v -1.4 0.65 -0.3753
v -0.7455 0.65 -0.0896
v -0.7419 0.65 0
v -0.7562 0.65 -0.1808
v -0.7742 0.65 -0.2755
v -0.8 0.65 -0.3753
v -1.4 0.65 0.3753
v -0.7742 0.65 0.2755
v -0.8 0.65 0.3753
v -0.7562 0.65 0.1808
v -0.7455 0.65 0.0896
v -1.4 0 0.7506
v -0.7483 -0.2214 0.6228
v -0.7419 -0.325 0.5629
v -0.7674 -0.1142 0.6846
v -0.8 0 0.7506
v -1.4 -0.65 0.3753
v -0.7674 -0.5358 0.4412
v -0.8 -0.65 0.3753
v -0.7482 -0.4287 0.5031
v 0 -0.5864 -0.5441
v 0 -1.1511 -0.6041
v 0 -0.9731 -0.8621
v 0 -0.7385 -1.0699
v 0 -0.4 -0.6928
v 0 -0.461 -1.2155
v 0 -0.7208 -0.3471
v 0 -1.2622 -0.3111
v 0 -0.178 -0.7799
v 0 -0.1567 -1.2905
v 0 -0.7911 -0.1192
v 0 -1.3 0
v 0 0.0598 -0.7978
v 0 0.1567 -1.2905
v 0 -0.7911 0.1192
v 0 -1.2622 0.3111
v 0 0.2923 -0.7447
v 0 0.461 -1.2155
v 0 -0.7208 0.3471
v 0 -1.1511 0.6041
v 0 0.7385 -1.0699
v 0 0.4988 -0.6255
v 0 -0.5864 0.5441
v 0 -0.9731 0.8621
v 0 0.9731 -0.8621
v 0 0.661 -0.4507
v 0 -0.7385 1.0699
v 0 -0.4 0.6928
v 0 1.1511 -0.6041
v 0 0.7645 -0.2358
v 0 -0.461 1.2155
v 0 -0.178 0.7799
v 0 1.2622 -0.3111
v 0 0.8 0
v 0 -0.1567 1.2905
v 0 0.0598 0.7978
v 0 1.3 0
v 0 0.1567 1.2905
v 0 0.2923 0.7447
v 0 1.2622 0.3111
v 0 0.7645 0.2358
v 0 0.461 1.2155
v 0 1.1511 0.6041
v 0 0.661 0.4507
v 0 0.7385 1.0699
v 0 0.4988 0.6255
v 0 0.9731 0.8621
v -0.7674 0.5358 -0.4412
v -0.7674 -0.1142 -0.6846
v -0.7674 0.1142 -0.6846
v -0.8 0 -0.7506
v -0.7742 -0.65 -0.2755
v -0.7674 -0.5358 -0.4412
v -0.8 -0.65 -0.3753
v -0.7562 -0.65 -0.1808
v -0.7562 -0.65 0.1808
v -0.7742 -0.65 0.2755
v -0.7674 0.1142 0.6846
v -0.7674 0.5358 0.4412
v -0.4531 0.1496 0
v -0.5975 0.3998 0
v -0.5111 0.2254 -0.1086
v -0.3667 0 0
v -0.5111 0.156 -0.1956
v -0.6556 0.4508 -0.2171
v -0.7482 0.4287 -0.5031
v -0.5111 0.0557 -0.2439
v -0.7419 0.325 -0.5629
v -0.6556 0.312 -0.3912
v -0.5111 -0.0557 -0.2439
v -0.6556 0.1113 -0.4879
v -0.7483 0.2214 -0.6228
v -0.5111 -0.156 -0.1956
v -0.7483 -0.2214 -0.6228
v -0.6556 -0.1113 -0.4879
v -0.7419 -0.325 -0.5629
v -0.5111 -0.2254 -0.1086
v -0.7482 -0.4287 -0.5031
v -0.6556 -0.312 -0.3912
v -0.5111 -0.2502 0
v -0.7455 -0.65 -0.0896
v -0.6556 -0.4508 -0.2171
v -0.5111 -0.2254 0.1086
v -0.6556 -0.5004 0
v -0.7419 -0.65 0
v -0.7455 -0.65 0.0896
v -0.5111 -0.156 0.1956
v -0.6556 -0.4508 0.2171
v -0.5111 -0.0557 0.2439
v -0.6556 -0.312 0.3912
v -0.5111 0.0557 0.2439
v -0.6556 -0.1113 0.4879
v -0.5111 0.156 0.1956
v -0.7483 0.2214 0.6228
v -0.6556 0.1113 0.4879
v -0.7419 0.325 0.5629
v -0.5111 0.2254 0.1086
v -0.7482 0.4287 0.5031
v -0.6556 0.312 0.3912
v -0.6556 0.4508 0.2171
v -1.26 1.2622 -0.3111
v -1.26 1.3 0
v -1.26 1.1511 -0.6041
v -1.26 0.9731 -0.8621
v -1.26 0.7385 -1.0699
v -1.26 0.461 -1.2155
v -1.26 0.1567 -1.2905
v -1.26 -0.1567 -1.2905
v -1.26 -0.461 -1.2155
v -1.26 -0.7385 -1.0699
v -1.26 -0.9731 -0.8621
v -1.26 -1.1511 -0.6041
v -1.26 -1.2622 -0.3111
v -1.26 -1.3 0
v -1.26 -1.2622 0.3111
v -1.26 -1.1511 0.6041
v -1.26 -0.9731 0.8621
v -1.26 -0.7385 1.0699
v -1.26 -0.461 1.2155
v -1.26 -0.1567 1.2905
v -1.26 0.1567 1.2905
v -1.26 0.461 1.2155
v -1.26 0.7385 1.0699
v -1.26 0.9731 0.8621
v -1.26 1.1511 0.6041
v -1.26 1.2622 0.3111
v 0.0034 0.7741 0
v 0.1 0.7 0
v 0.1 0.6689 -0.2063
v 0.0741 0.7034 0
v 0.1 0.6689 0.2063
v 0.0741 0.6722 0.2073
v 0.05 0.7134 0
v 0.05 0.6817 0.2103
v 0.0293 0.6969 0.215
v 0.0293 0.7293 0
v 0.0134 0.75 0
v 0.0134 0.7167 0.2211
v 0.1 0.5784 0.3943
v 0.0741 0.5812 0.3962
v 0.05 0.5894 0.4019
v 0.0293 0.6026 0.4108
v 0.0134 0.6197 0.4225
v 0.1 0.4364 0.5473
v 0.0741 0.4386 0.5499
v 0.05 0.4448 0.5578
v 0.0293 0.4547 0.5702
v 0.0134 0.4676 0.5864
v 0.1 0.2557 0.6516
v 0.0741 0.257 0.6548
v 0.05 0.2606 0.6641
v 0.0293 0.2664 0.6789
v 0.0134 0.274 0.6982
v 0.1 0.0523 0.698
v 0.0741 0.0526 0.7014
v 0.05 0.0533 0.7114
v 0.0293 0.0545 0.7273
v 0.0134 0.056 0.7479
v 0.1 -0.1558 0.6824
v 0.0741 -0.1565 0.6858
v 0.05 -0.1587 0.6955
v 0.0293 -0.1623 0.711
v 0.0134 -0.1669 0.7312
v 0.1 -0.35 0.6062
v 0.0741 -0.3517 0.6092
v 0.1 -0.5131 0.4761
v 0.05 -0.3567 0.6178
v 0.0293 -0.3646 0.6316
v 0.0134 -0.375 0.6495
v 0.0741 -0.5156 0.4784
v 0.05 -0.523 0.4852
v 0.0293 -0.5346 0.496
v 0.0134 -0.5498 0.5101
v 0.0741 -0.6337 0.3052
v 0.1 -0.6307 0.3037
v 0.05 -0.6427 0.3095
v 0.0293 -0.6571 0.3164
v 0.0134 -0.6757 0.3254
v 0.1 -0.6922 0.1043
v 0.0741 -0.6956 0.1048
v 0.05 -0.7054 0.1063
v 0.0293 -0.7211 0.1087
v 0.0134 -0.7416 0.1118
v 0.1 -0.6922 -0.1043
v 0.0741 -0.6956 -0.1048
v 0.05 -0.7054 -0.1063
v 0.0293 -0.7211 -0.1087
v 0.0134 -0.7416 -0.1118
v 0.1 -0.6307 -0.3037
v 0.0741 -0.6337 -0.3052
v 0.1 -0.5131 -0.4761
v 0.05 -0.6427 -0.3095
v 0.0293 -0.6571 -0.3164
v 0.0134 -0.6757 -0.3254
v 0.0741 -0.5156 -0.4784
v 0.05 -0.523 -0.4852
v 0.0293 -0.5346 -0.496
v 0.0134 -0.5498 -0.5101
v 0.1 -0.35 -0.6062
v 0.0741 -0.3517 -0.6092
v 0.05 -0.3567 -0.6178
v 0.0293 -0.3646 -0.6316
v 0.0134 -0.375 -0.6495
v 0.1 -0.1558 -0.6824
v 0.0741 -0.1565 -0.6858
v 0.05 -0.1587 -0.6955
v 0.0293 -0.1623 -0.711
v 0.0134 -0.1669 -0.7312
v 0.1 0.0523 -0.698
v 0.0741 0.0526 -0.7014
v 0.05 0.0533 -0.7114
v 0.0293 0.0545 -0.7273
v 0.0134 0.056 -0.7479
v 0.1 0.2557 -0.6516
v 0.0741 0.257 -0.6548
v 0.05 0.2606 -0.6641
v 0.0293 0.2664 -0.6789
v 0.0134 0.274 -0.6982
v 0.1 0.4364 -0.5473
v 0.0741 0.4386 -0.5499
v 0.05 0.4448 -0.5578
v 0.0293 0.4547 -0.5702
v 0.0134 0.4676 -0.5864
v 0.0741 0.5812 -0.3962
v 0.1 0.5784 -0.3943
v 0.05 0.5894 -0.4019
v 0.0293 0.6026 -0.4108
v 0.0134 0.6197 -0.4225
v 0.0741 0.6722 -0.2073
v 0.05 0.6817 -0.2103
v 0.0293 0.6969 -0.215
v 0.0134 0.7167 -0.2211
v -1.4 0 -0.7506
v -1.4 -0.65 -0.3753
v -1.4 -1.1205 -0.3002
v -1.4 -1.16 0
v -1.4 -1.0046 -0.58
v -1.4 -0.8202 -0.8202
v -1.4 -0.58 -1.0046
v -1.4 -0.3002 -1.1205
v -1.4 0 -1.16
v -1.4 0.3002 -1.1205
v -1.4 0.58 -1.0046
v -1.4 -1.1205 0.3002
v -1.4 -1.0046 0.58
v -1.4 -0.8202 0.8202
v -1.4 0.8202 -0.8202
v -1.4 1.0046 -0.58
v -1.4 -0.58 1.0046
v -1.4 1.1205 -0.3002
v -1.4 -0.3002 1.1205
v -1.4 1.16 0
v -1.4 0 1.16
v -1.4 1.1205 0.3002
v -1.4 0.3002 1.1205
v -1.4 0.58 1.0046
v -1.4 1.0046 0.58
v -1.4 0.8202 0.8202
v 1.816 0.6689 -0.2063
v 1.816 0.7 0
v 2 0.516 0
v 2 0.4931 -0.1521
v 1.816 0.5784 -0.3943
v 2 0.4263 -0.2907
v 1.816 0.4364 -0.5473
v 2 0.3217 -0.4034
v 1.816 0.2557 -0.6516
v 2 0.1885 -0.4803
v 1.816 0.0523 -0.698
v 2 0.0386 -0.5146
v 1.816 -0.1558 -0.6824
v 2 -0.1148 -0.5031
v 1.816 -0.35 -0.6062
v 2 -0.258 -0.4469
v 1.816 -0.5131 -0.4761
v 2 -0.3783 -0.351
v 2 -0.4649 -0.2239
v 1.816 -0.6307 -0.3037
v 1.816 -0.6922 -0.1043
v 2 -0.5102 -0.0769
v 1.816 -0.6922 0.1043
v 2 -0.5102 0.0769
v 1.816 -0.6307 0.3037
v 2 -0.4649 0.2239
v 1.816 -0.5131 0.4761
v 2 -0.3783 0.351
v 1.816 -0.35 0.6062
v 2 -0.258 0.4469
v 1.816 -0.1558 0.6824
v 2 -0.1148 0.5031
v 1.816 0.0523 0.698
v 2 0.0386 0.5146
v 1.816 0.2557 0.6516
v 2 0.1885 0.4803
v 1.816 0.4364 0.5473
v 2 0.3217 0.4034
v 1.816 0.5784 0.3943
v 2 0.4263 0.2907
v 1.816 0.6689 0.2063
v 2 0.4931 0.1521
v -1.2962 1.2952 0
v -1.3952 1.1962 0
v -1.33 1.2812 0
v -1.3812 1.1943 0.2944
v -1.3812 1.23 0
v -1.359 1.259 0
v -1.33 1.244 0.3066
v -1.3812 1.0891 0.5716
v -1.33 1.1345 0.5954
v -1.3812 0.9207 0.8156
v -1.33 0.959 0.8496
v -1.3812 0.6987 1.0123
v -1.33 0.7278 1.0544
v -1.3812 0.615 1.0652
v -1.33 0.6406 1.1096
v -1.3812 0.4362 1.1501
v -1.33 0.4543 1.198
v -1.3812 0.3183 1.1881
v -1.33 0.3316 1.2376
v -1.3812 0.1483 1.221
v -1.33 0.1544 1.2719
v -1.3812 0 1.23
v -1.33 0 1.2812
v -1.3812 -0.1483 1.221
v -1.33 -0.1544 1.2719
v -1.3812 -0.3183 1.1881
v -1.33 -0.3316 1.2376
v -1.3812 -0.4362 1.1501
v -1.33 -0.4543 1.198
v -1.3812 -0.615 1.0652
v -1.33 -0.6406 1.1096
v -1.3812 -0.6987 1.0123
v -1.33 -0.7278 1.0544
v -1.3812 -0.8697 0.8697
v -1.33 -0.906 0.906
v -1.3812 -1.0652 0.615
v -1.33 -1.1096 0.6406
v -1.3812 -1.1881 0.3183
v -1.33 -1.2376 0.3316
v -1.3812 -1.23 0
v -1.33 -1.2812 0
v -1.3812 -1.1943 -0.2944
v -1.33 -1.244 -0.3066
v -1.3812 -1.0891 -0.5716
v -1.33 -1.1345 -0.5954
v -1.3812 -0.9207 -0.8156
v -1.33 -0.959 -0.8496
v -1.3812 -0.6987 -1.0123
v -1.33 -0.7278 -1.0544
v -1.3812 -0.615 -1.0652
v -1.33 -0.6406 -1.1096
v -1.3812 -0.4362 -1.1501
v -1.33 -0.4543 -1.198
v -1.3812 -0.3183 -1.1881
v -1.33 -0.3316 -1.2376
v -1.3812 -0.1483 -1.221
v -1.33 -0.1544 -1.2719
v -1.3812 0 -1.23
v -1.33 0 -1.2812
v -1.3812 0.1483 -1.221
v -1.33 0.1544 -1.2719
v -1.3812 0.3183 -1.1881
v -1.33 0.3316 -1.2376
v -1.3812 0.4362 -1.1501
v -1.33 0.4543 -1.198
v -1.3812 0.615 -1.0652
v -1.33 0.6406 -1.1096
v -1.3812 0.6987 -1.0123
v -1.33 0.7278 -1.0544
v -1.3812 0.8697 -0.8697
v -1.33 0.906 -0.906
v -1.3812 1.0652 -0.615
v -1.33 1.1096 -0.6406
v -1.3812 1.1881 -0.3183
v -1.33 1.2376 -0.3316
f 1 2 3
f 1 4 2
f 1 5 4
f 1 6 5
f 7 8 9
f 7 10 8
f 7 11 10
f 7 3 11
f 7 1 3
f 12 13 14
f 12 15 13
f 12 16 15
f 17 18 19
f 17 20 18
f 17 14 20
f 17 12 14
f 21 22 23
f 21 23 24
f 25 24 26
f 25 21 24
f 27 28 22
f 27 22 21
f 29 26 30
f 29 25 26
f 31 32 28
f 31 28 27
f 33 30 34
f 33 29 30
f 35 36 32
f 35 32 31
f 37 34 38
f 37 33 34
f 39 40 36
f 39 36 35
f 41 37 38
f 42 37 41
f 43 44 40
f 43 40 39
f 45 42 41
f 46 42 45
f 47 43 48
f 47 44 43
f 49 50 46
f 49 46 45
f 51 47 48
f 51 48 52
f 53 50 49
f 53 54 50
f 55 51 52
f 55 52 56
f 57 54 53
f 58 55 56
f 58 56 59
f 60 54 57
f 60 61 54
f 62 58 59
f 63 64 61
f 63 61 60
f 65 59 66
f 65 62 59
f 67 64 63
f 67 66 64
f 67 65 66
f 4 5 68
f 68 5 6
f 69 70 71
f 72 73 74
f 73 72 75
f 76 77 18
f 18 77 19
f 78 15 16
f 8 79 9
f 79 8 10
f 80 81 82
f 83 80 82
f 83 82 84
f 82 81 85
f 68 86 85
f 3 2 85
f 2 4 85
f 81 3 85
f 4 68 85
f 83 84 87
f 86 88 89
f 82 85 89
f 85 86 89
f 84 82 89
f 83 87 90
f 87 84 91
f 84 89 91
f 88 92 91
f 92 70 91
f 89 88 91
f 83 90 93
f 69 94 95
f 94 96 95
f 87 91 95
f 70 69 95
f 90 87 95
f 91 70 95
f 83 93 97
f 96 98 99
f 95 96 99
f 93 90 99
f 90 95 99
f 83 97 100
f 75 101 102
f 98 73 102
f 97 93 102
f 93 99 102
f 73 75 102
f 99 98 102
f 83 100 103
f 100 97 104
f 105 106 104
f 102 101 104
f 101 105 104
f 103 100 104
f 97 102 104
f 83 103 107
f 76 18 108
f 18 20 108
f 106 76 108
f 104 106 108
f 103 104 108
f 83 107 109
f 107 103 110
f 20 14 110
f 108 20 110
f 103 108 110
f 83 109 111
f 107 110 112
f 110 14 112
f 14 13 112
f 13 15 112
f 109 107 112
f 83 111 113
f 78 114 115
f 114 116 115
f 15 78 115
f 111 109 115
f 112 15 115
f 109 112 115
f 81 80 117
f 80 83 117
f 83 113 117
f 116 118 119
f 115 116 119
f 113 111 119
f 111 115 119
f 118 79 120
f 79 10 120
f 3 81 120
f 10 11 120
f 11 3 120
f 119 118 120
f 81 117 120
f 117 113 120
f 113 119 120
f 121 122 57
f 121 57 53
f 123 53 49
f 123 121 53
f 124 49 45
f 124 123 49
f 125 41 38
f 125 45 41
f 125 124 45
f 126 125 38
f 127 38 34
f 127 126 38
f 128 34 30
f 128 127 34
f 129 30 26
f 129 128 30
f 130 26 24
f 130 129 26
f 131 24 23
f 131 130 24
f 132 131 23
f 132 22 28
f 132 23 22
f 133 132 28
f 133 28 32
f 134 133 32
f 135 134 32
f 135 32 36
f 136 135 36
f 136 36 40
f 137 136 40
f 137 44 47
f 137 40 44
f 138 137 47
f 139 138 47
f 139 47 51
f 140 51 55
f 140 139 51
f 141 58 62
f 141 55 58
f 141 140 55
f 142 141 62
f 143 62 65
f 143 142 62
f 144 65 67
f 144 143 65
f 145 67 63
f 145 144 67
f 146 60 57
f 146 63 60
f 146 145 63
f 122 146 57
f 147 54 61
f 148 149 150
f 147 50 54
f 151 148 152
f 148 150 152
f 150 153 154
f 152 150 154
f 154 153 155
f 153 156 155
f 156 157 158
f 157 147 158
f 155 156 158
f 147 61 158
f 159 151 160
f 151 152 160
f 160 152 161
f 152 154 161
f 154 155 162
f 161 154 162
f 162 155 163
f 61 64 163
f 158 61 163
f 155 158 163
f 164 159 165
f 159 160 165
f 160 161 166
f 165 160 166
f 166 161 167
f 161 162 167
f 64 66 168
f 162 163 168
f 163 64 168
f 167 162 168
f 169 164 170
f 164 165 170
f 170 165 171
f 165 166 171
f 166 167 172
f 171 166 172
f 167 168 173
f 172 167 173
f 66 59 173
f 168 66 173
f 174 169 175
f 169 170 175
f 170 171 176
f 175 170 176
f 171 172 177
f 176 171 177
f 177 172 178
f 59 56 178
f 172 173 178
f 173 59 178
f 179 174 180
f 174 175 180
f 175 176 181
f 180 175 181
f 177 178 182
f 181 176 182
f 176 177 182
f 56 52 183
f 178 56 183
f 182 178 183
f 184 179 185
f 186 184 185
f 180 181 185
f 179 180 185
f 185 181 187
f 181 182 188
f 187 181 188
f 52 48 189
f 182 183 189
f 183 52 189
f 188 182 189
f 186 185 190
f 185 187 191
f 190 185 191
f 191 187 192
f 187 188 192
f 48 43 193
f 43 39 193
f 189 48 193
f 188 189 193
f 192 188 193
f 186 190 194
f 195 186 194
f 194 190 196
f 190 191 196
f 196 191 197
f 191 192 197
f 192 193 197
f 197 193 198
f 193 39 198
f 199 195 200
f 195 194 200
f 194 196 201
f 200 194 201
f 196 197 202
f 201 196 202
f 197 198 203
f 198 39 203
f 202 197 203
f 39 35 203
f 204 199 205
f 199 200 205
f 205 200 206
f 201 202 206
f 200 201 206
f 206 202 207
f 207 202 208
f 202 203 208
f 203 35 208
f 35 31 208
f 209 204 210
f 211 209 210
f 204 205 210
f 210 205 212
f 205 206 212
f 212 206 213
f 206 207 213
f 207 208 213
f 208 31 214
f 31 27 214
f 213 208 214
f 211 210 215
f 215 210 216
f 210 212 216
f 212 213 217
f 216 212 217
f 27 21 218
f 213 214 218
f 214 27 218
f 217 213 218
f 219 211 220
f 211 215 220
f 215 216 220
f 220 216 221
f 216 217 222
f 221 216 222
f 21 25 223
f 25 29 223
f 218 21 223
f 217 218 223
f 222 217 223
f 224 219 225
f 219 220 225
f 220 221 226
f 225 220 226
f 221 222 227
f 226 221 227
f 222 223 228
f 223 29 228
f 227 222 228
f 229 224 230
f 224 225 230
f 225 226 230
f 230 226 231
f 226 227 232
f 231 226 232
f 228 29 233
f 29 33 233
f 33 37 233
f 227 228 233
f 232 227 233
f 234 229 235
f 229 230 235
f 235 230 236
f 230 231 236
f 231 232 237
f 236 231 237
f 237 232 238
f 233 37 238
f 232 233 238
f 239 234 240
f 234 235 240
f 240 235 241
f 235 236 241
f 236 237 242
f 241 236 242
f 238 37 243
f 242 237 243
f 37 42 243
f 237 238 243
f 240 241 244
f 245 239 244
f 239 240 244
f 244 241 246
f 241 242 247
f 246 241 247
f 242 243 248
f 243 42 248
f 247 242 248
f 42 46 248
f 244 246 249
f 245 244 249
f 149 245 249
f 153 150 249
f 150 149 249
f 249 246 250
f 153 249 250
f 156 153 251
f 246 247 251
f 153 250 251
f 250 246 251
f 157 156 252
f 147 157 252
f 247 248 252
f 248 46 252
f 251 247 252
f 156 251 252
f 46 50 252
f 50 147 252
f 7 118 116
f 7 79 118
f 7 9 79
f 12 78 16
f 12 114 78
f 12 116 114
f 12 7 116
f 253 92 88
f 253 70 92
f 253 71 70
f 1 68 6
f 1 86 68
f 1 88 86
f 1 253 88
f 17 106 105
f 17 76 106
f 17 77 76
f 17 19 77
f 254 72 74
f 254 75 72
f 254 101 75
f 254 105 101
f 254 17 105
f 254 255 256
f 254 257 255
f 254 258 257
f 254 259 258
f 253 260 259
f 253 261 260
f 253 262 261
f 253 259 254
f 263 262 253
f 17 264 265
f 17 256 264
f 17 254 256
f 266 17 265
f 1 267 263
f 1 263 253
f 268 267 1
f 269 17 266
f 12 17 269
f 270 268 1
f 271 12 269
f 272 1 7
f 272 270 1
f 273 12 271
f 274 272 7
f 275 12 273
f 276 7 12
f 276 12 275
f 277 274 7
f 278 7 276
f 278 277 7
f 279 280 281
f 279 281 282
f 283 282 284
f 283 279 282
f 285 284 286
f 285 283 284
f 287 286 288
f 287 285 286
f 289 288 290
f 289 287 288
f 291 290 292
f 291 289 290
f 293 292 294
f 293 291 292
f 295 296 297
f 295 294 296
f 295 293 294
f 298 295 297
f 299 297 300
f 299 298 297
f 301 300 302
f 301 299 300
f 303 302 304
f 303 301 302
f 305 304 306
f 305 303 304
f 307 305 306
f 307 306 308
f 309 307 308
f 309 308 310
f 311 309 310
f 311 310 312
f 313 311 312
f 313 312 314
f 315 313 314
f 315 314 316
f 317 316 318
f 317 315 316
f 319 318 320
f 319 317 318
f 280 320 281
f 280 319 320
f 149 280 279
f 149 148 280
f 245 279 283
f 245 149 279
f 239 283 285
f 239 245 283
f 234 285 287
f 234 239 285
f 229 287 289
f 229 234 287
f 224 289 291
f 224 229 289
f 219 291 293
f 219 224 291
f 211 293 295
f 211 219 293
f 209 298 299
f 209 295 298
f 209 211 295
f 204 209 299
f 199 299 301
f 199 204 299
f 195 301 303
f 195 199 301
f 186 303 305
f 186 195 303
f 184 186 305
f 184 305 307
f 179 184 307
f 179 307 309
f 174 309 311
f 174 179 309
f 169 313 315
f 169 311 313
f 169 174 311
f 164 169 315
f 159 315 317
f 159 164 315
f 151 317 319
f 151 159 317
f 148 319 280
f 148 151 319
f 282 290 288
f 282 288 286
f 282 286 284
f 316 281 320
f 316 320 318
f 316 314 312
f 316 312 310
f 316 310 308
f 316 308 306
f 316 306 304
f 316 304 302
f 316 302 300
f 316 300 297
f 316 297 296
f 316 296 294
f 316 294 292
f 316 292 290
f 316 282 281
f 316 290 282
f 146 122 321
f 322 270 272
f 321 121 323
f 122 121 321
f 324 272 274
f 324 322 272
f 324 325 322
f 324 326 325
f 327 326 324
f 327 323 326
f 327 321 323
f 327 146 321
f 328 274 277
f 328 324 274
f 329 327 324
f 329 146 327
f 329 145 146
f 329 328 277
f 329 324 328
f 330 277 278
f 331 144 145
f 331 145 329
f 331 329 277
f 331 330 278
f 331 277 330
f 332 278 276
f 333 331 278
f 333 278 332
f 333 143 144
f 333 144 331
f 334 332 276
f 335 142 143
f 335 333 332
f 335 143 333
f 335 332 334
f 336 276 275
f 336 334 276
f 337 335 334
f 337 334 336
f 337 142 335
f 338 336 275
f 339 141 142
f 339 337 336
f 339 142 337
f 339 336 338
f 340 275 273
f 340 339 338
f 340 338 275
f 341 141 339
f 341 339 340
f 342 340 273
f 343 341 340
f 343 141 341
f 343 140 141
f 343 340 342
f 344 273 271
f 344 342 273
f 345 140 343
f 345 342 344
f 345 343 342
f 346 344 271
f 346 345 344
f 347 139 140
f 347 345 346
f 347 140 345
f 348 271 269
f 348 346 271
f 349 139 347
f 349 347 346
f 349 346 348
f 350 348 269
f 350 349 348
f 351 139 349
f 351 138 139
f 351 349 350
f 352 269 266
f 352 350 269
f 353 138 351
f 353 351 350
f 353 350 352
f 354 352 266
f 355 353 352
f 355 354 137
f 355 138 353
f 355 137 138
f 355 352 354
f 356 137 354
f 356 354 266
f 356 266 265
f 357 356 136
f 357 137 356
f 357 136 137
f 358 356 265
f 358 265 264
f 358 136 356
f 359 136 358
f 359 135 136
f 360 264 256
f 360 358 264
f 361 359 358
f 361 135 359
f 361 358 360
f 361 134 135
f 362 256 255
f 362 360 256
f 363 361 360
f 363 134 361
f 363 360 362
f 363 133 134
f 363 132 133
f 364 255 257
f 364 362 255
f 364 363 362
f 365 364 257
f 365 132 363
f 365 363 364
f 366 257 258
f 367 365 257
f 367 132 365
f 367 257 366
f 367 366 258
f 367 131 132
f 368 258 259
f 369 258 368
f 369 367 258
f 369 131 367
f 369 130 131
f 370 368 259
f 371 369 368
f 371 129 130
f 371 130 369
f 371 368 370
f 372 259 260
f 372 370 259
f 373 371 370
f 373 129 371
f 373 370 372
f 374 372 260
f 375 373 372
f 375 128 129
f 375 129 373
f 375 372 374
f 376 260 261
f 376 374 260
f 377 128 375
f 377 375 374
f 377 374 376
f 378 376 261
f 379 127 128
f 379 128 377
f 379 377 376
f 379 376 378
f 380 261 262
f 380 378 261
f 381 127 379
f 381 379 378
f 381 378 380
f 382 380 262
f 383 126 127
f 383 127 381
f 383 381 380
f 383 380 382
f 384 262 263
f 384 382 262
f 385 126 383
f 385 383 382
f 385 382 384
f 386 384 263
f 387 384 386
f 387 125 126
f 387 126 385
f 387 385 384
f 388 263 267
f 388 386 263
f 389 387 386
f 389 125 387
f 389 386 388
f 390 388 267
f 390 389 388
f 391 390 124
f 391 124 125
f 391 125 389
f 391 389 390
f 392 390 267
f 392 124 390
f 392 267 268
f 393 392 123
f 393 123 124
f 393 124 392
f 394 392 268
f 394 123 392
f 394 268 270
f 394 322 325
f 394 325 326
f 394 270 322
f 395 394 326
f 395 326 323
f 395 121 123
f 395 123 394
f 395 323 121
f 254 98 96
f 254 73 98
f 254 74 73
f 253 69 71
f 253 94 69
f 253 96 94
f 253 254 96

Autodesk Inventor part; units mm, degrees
ref_plane "YZ Plane" through (0, 0, 0) normal (1, 0, 0) x (0, 1, 0)
ref_plane "XZ Plane" through (0, 0, 0) normal (0, 1, 0) x (-1, 0, 0)
sketch "Skizze1" plane through (0, 0, 0) normal (0, 0, 1) x (1, 0, 0)
  line L0 (-0.3667, 0) -> (2, 0)
  line L1 (2, 0) -> (2, 0.7)
  line L2 (2, 0.7) -> (0.75, 0.7)
  line L3 (0.75, 0.7) -> (0.5659, 0.7)
  line L4 (0.5659, 0.7) -> (0, 0.7)
  line L5 (0, 0.7) -> (0, 1.3)
  line L6 (0, 1.3) -> (-1.4, 1.3)
  line L7 (-1.4, 1.3) -> (-1.4, 0.7506)
  line L8 (-1.4, 0.7506) -> (-0.8, 0.7506)
  line L9 (-0.8, 0.7506) -> (-0.3667, 0)
  line L10 (-2.08, 0) -> (2.68, 0) projected
  line L11 (0, -0.26) -> (0, 1.56) projected
  line L12 (0.75, 0.7) -> (0, 0.7) construction
  dimension "d1" = 1.25
  dimension "d2" = 0.1841
  dimension "d3" = 1.4
  dimension "d4" = 0.6
  dimension "d5" = 60
  dimension "d6" = 1.4
  dimension "d7" = 1.4
  dimension "d8" = 1.5011
  dimension "d9" = 2.6
  dimension "d26" = 2
revolve "Körper" add sketch "Skizze1" angle 360 about axis through (-0.3667, 0, 0) along (1, 0, 0)
sketch "Skizze2" plane through (-1.4, 0, 0) normal (-1, 0, 0) x (0, 0, 1)
  circle A0 centre (0, 0) radius 0.7506 projected
  line L0 (0, -1.82) -> (0, 1.82) projected
  line L1 (-1.82, 0) -> (1.82, 0) projected
  line L2 (0.7506, 0) -> (0.3753, -0.65)
  line L3 (0.3753, -0.65) -> (-0.3753, -0.65)
  line L4 (-0.3753, -0.65) -> (-0.7506, 0)
  line L5 (-0.7506, 0) -> (-0.3753, 0.65)
  line L6 (-0.3753, 0.65) -> (0.3753, 0.65)
  line L7 (0.3753, 0.65) -> (0.7506, 0)
extrude "Loch" add sketch "Skizze2" against normal up to next contours L7 A0 | A0 L2 | L6 L0 A0 | A0 L0 L3 | L0 L6 A0 | A0 L3 L0 | L4 A0 | A0 L5
fillet "Rundung1" radius 0.14 1 edges at (-1.4, -1.3, 0)
thread "Gewinde" size "M1.4x0.3" class "6g" standard "ISO Metric profile" length 1.25
chamfer "Fase1" distance 0.184 distance2 0.184 1 edges at (2, -0.7, 0) measured on face at (2, -0.4907, -0.0634)
ref_plane "Work Plane1" through (29, 0, 0) normal (0, -1, 0) x (1, 0, 0)
fillet "Fillet2" radius 0.1 1 edges at (0, -0.7, 0)
equation "\"d1\" = GEL"
equation "\"d3\" = KOH"
equation "\"d4\" = INTI"
equation "\"d6\" = GD"
equation "\"d7\" = BDM"
equation "\"d8\" = 1.1547 * SW"
equation "\"d9\" = KOD"
equation "\"d26\" = NLG"
equation "\"d30\" = R"
equation "\"d17\" = RR"
equation "\"d13\" = GEL"
equation "\"d15\" = -0.5 * SPD + 0.5 * GD"
equation "\"d16\" = GUL"
equation "\"GD\" = NND"
equation "\"NLG\" = 2"
equation "\"GEL\" = 1.25"
equation "\"KOD\" = 2.6"
equation "\"KOH\" = 1.4"
equation "\"INTI\" = 0.6"
equation "\"GAL\" = 0.61345 * PTC"
equation "\"GUL\" = 0.61345 * PTC"
equation "\"BDM\" = NND"
equation "\"SW\" = 1.3"
equation "\"RR\" = 0.14"
equation "\"SPD\" = NND - 1.2269 * PTC"
equation "\"R\" = 0.1"
equation "\"TOA\" = 30deg"
equation "\"GD1\" = THREADDIA - 1.2269 * PTC"
equation "\"THREADDIA\" = 1.4"
equation "\"FAWI\" = 45deg"
equation "\"ANG\" = 120deg"
equation "\"PTC\" = 0.3"
equation "\"NND\" = 1.4"
equation "\"E0\" = 1.155 * SW"
properties part number "DIN 912 - M1,4 x 2" material "Stahl, weich"
